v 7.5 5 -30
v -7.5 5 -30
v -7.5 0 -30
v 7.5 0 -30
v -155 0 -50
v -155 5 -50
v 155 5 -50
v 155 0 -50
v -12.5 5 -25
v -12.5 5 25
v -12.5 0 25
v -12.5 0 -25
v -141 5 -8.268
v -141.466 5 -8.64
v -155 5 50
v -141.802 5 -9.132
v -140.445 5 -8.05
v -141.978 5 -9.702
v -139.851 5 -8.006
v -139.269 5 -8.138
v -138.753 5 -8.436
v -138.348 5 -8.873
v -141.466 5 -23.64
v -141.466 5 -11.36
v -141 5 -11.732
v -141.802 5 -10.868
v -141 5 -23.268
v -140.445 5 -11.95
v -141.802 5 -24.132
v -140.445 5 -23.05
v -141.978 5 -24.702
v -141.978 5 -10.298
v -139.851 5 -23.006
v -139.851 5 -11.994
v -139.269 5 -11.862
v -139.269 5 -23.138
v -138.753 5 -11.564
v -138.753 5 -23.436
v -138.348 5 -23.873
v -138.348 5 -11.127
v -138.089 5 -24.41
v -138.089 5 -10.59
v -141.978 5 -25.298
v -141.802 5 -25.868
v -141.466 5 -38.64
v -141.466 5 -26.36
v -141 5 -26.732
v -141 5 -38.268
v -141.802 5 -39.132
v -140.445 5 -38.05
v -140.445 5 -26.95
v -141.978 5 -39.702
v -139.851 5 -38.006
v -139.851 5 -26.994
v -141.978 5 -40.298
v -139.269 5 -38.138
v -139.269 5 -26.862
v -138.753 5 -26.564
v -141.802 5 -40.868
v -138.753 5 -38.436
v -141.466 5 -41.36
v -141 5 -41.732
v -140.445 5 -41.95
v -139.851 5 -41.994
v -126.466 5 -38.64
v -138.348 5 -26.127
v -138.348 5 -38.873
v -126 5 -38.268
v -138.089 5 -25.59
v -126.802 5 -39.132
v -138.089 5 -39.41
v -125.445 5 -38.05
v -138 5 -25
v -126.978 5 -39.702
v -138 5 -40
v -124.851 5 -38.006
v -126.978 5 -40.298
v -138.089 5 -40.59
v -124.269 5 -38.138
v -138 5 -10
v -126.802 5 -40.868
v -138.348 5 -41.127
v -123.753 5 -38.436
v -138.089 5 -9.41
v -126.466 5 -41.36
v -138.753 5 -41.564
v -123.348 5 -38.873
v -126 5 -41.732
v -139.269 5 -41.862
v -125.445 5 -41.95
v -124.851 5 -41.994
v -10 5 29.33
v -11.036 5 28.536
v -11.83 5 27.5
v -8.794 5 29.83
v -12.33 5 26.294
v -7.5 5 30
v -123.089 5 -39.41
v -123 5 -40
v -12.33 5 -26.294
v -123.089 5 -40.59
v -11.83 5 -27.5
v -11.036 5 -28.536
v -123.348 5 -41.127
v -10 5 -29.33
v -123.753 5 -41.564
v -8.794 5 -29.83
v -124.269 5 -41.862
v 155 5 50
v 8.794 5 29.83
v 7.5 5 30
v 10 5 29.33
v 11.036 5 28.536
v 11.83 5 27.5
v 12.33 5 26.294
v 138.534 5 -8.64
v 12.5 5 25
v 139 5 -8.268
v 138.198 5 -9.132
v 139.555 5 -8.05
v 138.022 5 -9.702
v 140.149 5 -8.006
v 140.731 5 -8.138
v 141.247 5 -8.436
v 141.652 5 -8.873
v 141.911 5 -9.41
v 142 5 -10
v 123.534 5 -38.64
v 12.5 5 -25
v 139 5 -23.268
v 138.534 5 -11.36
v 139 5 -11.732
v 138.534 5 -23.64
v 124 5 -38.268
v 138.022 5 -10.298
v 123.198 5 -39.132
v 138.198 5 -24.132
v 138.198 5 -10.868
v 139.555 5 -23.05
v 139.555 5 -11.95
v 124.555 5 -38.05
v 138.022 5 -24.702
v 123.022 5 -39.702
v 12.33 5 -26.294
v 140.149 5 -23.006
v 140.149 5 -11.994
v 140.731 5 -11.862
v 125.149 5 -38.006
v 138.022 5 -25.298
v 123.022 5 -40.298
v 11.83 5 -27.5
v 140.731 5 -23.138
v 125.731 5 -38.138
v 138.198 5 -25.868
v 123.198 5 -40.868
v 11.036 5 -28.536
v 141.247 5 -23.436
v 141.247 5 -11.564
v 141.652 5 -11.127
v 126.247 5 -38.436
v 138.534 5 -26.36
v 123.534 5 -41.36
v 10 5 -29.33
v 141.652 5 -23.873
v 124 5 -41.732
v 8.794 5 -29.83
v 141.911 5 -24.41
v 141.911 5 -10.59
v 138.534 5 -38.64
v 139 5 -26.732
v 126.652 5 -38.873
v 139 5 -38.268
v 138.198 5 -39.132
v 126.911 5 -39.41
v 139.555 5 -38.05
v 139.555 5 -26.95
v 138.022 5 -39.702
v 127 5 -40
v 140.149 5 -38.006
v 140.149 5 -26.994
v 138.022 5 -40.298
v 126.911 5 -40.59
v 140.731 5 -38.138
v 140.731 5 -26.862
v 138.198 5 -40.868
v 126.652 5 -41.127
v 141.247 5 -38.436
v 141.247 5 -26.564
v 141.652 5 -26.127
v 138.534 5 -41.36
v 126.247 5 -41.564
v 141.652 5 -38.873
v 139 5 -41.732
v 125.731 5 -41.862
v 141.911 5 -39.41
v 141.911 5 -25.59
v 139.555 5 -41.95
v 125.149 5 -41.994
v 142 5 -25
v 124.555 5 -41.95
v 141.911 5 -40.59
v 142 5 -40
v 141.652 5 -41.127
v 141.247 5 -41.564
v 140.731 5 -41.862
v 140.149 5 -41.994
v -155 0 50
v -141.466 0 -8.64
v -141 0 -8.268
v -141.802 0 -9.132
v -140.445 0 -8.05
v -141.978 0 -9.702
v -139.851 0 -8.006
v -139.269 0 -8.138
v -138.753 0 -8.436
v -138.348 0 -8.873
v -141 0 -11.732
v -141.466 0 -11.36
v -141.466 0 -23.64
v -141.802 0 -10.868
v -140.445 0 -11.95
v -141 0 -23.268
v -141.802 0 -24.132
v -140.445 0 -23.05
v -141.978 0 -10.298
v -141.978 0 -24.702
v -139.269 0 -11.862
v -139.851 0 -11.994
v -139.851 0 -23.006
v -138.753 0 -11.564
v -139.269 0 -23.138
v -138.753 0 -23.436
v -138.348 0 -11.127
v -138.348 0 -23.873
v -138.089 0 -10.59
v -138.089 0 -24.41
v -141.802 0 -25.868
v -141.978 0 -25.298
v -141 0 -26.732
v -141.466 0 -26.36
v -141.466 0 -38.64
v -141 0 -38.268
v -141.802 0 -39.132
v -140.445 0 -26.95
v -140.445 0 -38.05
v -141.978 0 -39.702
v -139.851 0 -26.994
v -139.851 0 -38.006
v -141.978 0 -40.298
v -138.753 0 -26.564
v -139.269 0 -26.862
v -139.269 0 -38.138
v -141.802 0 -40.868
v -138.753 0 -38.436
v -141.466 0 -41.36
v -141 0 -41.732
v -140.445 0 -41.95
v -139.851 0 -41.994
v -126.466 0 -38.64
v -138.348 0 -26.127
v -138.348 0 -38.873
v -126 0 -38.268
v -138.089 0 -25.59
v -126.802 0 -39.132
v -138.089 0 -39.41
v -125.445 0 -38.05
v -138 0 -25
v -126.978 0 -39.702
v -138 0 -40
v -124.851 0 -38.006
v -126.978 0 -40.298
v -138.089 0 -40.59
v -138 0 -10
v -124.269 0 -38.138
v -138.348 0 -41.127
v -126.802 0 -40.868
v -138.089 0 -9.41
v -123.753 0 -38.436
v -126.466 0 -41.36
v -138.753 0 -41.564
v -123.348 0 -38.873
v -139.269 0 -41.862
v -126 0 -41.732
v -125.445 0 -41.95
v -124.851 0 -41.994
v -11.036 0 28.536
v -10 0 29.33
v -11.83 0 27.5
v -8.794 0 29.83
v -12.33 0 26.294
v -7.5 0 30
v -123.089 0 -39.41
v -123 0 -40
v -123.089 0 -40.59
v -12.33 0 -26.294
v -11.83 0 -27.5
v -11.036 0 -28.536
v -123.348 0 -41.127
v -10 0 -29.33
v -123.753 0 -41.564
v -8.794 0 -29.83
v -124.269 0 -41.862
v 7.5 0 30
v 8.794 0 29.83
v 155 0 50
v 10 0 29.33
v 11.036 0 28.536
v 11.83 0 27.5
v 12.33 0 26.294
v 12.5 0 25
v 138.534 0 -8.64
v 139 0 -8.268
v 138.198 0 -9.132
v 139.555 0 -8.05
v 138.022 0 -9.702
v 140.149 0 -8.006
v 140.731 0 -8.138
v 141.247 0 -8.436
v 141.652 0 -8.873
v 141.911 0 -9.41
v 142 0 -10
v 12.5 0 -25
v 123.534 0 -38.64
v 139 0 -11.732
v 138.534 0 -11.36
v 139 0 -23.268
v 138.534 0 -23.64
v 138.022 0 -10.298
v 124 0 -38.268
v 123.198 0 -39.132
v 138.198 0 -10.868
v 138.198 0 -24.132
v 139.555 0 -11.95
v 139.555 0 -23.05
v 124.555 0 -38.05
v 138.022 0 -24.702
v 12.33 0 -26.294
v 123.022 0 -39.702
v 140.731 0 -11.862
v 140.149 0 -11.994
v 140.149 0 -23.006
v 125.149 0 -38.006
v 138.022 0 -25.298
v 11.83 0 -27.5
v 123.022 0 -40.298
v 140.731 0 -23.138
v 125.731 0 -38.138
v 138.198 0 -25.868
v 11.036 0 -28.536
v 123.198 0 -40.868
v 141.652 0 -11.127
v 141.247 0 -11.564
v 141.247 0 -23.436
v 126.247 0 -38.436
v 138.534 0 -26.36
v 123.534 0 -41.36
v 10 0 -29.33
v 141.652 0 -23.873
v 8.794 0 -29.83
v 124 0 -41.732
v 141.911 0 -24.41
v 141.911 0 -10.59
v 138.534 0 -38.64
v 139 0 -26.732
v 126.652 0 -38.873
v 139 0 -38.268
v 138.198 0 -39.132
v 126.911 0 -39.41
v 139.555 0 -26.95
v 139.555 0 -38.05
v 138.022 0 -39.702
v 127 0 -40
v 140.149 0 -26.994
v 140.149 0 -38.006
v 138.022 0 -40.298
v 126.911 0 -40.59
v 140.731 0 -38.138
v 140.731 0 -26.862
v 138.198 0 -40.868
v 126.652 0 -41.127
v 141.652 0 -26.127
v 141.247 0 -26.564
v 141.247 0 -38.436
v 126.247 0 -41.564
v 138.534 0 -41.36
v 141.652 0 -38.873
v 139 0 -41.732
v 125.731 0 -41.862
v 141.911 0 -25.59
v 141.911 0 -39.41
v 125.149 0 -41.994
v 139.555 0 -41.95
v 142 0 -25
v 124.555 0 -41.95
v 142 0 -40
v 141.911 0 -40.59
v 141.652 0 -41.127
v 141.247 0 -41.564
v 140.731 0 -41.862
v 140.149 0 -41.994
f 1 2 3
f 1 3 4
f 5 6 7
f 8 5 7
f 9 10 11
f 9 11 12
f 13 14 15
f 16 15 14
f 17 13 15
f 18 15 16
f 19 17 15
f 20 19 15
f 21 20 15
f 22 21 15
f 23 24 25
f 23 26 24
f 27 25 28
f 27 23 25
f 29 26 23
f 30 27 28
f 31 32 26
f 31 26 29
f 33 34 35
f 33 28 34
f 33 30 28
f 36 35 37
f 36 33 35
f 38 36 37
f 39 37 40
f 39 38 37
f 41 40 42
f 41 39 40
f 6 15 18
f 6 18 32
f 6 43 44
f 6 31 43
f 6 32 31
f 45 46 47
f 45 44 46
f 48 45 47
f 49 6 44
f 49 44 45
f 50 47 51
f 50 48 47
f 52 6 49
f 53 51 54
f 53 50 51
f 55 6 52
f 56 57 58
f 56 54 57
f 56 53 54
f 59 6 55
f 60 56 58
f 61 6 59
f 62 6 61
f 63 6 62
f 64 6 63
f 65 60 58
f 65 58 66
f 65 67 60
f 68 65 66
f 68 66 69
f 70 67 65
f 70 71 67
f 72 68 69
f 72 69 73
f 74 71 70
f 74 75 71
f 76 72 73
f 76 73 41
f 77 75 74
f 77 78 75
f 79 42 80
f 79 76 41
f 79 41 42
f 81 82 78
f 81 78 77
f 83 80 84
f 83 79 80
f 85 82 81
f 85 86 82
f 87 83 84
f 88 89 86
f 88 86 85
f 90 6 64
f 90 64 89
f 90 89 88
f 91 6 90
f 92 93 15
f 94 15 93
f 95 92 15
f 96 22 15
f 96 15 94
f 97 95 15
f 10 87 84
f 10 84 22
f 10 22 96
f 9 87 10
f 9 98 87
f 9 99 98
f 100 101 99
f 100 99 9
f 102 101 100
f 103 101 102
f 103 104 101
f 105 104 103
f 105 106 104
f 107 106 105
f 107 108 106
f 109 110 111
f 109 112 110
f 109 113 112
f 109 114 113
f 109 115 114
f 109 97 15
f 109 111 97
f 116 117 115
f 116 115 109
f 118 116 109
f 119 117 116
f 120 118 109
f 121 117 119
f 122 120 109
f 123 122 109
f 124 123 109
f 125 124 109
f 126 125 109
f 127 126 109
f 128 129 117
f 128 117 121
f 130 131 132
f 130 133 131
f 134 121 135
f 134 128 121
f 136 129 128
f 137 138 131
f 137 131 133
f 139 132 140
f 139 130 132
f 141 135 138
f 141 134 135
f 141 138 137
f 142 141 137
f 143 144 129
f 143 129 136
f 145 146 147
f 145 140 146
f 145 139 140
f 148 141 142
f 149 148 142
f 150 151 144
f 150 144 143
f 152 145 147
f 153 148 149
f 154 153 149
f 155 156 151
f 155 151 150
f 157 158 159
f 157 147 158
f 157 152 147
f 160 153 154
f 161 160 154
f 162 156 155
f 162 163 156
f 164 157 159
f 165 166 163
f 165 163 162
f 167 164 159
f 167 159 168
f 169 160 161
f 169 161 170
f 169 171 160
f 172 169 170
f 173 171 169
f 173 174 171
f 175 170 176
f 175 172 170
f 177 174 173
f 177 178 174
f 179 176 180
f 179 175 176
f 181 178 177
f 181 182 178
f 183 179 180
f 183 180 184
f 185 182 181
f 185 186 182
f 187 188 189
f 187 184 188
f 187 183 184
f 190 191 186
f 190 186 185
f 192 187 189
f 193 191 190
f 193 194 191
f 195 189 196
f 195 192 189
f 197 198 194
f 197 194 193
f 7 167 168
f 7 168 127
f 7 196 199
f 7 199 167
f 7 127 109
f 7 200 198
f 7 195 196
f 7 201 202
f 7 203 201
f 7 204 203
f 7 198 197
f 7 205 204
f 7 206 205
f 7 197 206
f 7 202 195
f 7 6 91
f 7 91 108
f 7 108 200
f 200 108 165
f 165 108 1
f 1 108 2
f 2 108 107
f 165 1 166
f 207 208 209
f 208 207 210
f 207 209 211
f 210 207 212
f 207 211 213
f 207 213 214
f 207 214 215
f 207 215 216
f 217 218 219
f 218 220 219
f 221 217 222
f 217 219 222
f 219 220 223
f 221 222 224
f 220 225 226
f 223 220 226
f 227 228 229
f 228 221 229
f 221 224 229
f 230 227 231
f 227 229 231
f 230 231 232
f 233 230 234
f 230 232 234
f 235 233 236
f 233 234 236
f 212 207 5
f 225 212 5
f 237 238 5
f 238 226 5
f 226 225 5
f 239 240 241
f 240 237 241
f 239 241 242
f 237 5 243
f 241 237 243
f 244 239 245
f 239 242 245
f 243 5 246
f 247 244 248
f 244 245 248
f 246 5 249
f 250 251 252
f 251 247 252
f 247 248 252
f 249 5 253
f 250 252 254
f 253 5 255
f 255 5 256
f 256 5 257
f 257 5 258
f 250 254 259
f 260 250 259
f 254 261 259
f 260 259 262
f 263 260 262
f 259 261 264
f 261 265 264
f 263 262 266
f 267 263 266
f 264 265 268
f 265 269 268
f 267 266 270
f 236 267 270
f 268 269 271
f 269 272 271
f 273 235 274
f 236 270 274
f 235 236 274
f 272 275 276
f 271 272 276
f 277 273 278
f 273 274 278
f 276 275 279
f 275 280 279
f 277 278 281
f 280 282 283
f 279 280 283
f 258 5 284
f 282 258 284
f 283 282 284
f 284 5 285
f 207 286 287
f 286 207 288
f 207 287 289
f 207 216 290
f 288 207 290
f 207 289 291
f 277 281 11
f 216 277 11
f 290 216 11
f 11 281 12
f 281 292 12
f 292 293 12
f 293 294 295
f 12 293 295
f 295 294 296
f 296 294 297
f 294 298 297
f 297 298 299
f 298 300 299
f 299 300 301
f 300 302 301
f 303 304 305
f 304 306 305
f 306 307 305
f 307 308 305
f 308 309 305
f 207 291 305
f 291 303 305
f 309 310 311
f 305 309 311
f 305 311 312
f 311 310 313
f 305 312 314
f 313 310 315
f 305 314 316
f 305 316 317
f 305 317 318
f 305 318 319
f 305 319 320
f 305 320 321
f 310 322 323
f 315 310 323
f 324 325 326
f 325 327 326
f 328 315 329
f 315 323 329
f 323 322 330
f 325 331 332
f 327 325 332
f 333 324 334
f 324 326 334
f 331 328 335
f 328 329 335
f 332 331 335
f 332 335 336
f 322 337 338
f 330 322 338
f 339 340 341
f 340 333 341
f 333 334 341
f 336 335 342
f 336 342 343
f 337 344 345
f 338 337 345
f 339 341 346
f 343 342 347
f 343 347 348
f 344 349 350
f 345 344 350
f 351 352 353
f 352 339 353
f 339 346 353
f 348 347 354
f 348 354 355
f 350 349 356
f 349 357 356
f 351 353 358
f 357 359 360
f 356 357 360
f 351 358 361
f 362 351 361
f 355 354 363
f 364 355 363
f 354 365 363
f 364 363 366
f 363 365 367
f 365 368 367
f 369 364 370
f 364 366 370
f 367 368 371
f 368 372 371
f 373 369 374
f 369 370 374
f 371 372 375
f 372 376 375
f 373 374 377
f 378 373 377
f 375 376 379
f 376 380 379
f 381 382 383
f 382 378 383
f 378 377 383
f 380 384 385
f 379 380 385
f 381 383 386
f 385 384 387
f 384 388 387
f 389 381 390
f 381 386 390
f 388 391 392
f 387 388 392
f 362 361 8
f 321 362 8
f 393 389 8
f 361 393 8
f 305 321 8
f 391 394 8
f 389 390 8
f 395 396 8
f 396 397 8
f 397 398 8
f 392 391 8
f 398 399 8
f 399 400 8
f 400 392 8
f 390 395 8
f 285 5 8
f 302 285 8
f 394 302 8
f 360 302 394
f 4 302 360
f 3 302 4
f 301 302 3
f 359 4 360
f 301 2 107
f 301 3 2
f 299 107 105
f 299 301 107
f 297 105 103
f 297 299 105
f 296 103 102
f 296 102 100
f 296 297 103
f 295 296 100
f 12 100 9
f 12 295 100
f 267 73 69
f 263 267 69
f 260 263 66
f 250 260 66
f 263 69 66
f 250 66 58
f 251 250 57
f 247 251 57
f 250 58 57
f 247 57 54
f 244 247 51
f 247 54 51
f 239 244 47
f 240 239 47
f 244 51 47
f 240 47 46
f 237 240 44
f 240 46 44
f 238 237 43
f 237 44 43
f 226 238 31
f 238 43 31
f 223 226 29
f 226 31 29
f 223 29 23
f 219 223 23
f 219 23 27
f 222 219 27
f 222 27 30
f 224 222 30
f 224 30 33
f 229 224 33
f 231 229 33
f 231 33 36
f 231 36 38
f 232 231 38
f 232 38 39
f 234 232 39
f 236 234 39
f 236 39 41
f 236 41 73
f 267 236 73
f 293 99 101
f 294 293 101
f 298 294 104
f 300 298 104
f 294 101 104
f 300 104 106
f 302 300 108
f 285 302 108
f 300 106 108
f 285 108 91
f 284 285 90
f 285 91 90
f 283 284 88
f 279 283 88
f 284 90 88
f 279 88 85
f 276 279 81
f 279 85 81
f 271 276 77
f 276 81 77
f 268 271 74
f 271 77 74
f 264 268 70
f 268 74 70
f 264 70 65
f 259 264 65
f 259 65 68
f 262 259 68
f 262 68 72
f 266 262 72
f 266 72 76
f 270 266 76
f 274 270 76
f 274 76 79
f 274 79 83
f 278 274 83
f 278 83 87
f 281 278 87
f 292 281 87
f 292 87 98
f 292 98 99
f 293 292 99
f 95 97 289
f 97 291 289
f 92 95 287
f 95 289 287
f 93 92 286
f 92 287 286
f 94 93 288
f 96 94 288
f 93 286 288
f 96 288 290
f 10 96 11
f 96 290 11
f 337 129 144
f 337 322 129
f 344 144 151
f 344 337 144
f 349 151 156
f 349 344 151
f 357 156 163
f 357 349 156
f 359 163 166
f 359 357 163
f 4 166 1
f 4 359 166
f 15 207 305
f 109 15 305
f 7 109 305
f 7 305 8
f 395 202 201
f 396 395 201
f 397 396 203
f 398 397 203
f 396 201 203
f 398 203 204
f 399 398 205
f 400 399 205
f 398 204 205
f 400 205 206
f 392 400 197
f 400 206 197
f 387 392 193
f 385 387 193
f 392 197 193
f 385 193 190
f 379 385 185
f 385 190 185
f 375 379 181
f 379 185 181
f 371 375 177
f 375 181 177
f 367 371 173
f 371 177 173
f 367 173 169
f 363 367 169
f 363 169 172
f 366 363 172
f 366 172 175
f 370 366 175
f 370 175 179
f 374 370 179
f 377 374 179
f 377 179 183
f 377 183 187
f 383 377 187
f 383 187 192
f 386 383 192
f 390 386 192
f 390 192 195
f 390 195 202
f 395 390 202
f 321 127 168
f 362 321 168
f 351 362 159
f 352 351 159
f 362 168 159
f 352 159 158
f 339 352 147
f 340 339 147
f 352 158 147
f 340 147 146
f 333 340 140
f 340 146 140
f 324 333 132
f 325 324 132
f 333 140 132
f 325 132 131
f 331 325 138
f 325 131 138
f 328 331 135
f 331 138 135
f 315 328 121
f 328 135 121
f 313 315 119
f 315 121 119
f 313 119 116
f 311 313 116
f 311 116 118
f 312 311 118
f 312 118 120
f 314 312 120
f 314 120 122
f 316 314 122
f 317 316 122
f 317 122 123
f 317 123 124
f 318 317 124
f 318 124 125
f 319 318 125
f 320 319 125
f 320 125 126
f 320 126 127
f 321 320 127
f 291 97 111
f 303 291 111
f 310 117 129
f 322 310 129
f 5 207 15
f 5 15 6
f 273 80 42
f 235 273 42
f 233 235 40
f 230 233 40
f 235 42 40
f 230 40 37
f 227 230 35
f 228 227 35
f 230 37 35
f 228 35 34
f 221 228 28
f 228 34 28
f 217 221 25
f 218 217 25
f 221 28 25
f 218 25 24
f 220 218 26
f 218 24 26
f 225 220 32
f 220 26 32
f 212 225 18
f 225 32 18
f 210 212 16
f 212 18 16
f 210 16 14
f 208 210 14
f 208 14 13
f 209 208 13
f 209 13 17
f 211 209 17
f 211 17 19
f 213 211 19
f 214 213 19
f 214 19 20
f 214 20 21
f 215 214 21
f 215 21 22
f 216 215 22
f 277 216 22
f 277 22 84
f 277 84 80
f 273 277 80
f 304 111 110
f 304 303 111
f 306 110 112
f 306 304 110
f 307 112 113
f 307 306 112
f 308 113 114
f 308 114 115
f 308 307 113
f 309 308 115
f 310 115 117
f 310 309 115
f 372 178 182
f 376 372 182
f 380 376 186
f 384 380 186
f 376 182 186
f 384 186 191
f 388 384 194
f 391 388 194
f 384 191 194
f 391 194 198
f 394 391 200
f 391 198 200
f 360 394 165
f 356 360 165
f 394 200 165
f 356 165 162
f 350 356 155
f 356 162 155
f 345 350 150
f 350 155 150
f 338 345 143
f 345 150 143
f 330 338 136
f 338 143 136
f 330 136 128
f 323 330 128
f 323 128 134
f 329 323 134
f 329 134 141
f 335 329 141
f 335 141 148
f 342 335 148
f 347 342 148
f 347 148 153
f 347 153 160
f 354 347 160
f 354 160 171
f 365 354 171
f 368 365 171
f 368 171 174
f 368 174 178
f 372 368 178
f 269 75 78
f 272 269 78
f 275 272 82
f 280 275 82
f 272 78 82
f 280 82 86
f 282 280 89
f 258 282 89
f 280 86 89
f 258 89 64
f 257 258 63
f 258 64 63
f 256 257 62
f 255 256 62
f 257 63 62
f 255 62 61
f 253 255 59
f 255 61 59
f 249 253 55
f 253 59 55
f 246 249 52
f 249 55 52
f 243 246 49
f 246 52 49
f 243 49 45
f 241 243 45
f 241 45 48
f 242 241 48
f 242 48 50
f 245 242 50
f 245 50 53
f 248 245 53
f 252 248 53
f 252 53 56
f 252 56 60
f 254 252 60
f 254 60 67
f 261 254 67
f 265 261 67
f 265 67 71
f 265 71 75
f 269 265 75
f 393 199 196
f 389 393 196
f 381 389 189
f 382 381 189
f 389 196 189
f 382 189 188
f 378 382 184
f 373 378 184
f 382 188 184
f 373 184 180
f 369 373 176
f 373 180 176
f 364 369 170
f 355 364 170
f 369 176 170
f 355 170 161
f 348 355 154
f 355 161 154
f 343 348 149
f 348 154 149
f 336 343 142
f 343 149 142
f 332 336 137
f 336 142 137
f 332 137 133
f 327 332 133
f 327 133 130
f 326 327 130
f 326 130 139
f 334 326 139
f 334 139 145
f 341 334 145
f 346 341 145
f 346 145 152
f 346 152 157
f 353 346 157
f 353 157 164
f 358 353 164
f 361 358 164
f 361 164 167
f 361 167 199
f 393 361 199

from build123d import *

# Parameters (mm, degrees)
SKETCH1_W           = 120
SKETCH1_H           = 95
SKETCH1_W_2         = 310
SKETCH1_H_2         = 100
BOSS_EXTRUDE1_DEPTH = 5
SKETCH2_R           = 2
SKETCH2_W           = 25
SKETCH2_H           = 60
CUT_EXTRUDE1_DEPTH  = 6
FILLET1_R           = 5
SKETCH5_W           = 80
SKETCH5_H           = 70
CUT_EXTRUDE2_DEPTH  = 5
CHAMFER1_SIZE       = 20
SKETCH6_W           = 95
SKETCH6_H           = 95
BOSS_EXTRUDE2_DEPTH = 5
SKETCH7_W           = 310
SKETCH7_H           = 95
CUT_EXTRUDE3_DEPTH  = 6


with BuildPart() as part:
    # Sketch1 → Boss-Extrude1 (new body)
    with BuildSketch(Plane(origin=(0, 0, 0), x_dir=(1, 0, 0), z_dir=(0, 1, 0))):
        with Locations((0, 97.5)):
            Rectangle(SKETCH1_W, SKETCH1_H)
        Rectangle(SKETCH1_W_2, SKETCH1_H_2)
    extrude(amount=BOSS_EXTRUDE1_DEPTH)

    # Sketch2 → Cut-Extrude1 (cut, through all)
    with BuildSketch(Plane(origin=(0, 5, 0), x_dir=(1, 0, 0), z_dir=(0, 1, 0))):
        with Locations((-140, 40)):
            Circle(SKETCH2_R)
        with Locations((-125, 40)):
            Circle(SKETCH2_R)
        with Locations((-140, 25)):
            Circle(SKETCH2_R)
        with Locations((-140, 10)):
            Circle(SKETCH2_R)
        with Locations((140, 10)):
            Circle(SKETCH2_R)
        with Locations((140, 25)):
            Circle(SKETCH2_R)
        with Locations((125, 40)):
            Circle(SKETCH2_R)
        with Locations((140, 40)):
            Circle(SKETCH2_R)
        with Locations((-50, 130)):
            Circle(SKETCH2_R)
        with Locations((50, 130)):
            Circle(SKETCH2_R)
        Rectangle(SKETCH2_W, SKETCH2_H)
    extrude(amount=-CUT_EXTRUDE1_DEPTH, mode=Mode.SUBTRACT)

    # Fillet1
    fillet1_edges = [part.edges().sort_by_distance(p)[0] for p in [
        (12.5, 2.5, -30),
        (12.5, 2.5, 30),
        (-12.5, 2.5, 30),
        (-12.5, 2.5, -30),
    ]]
    fillet(fillet1_edges, radius=FILLET1_R)

    # Sketch5 → Cut-Extrude2 (cut)
    with BuildSketch(Plane(origin=(0, 5, 0), x_dir=(1, 0, 0), z_dir=(0, 1, 0))):
        with Locations((0, 85)):
            Rectangle(SKETCH5_W, SKETCH5_H)
    extrude(amount=-CUT_EXTRUDE2_DEPTH, mode=Mode.SUBTRACT)

    # Chamfer1
    chamfer1_edges = [part.edges().sort_by_distance(p)[0] for p in [
        (40, 2.5, -50),
        (-40, 2.5, -50),
        (-40, 2.5, -120),
        (40, 2.5, -120),
    ]]
    chamfer(chamfer1_edges, length=CHAMFER1_SIZE)

    # Sketch6 → Boss-Extrude2 (add)
    with BuildSketch(Plane(origin=(0, 5, 0), x_dir=(1, 0, 0), z_dir=(0, 1, 0))):
        with Locations((107.5, 97.5)):
            Rectangle(SKETCH6_W, SKETCH6_H)
        with Locations((-107.5, 97.5)):
            Rectangle(SKETCH6_W, SKETCH6_H)
    extrude(amount=-BOSS_EXTRUDE2_DEPTH)

    # Sketch7 → Cut-Extrude3 (cut, through all)
    with BuildSketch(Plane(origin=(0, 5, 0), x_dir=(1, 0, 0), z_dir=(0, 1, 0))):
        with Locations((0, 97.5)):
            Rectangle(SKETCH7_W, SKETCH7_H)
    extrude(amount=-CUT_EXTRUDE3_DEPTH, mode=Mode.SUBTRACT)


solid = part.part
